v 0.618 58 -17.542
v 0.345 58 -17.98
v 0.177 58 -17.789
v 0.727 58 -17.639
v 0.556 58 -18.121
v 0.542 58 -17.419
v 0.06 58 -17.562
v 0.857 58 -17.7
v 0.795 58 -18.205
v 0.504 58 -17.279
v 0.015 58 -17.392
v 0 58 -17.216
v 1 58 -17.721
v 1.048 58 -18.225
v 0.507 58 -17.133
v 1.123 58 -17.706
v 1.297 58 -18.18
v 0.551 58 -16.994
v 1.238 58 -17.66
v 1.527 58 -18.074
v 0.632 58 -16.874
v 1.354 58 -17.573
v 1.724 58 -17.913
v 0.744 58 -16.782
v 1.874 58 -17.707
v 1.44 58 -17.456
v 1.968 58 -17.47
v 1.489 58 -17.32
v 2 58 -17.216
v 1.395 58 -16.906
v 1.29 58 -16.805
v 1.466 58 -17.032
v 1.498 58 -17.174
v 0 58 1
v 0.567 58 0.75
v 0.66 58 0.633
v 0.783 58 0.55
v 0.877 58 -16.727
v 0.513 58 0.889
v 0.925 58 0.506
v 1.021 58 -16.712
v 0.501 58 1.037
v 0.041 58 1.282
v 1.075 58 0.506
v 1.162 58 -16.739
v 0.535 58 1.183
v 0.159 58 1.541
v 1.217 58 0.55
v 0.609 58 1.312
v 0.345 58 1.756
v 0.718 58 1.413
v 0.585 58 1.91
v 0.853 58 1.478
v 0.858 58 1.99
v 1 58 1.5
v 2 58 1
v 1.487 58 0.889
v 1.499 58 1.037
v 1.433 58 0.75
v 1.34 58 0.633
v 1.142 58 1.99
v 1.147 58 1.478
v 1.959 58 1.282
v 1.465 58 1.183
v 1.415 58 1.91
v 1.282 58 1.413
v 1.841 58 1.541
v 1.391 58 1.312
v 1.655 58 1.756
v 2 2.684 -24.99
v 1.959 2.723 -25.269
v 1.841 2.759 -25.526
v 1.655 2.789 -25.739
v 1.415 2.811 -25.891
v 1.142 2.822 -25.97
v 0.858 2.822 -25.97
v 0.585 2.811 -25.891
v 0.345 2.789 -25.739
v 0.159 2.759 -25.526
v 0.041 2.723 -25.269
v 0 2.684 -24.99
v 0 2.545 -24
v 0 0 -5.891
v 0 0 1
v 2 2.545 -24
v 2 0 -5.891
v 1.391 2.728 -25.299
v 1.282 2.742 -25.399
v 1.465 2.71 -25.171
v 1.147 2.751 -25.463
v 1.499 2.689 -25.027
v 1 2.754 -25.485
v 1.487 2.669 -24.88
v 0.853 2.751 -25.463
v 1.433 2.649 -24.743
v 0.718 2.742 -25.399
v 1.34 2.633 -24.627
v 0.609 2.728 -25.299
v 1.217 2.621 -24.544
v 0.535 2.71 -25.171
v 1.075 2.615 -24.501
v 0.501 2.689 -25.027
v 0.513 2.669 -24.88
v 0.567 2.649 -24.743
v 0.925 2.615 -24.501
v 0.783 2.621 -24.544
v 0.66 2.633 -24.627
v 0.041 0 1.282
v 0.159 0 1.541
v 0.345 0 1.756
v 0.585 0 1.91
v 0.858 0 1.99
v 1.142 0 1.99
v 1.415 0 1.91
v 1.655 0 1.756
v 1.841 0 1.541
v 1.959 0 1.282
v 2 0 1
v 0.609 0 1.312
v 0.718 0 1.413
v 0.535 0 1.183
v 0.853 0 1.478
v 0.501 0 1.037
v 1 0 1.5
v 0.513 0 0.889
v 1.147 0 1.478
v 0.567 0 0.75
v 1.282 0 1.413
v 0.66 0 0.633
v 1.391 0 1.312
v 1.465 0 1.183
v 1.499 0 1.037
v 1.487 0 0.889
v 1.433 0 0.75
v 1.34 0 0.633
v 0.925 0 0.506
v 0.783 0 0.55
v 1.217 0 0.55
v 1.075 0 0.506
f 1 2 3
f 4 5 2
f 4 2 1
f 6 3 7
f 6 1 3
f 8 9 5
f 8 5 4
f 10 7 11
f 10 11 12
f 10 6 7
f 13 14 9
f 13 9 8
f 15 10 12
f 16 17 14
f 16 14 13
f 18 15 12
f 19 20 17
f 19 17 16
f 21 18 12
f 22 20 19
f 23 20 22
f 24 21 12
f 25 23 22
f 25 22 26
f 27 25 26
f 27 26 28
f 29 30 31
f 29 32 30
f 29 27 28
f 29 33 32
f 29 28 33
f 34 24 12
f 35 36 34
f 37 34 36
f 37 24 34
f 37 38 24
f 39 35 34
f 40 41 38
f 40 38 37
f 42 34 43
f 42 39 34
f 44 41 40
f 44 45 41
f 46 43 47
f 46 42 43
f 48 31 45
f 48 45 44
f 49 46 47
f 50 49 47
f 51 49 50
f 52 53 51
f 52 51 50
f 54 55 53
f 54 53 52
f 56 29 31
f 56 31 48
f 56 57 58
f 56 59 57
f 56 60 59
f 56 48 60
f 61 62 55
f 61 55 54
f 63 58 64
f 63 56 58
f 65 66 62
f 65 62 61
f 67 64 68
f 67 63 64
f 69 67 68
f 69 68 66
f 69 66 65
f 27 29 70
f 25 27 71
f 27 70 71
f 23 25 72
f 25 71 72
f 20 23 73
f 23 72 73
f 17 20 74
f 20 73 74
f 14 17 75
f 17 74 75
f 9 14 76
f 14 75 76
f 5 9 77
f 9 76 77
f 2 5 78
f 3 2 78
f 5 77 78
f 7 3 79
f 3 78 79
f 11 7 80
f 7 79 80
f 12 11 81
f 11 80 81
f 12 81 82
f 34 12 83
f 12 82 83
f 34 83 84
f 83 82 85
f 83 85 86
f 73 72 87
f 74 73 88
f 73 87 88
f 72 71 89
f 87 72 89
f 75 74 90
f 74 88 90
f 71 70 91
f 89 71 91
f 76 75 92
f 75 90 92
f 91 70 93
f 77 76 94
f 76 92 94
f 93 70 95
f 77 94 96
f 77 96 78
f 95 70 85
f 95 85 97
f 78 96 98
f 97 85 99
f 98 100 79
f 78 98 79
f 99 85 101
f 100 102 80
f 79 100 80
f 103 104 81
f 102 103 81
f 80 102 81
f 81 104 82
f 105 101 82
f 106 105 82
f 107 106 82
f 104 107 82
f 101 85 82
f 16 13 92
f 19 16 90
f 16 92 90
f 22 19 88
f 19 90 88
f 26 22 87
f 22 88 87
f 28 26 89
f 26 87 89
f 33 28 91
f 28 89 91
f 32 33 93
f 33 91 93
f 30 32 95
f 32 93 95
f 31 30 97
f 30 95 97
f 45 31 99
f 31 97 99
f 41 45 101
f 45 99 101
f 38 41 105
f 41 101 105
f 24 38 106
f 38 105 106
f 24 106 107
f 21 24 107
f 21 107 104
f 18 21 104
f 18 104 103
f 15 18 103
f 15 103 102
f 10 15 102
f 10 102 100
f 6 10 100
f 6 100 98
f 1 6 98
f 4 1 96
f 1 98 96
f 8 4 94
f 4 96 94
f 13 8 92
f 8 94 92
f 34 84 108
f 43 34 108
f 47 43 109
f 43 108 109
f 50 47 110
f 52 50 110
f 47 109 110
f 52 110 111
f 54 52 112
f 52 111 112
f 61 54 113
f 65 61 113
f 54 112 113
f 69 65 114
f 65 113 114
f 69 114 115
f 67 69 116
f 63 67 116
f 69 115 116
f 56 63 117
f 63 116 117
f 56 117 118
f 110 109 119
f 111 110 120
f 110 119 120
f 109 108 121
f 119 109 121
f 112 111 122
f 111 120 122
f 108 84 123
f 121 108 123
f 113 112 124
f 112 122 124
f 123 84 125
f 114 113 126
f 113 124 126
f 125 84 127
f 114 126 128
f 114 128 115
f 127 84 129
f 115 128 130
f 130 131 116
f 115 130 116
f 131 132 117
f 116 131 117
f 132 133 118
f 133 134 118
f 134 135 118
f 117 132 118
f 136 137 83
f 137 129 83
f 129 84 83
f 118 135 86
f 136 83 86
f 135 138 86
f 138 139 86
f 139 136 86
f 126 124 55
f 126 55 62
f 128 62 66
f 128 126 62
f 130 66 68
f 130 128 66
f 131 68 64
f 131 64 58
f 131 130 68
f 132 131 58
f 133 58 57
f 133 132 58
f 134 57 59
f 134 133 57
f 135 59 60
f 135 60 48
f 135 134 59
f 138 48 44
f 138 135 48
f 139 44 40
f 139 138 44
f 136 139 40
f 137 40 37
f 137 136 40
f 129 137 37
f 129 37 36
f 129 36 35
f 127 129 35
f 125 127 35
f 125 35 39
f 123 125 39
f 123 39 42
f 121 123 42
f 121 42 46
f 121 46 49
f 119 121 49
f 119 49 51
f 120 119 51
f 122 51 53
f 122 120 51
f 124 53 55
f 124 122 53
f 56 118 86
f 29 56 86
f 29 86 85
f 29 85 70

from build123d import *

# Parameters (mm, degrees)
EXTRUDE_1_DEPTH = 2
SKETCH_2_R      = 0.5
EXTRUDE_2_DEPTH = 58
EXTRUDE_3_REACH = 65.509
SKETCH_3_R      = 0.5


with BuildPart() as part:
    # Эскиз1 → Бобышка-Вытянуть1 (new body)
    with BuildSketch(Plane(origin=(0, 0, 0), x_dir=(0, 0, -1), z_dir=(1, 0, 0))):
        Polygon((0, 58), (16.206306346, 58), (24, 2.54498815), (5.89146837, 0), (0, 0), align=None)
    extrude(amount=EXTRUDE_1_DEPTH)

    # Эскиз2 → Бобышка-Вытянуть2 (add)
    with BuildSketch(Plane(origin=(0, 0, 0), x_dir=(1, 0, 0), z_dir=(0, 1, 0))):
        with BuildLine():
            Line((2, 0), (0, 0))
            Line((0, 0), (0, -1))
            ThreePointArc((0, -1), (1, -2), (2, -1))
            Line((2, -1), (2, 0))
        make_face()
        with Locations(Location((1, -1, 0), (0, 0, 270))):
            Circle(SKETCH_2_R, mode=Mode.SUBTRACT)
    extrude(amount=EXTRUDE_2_DEPTH)

    # Бобышка-Вытянуть3: up to this plane
    extrude_3_end = Plane(origin=(2, 58, 0), z_dir=(0, 1, 0))
    # Эскиз3 → Бобышка-Вытянуть3 (add, up to the surface)
    with BuildSketch(Plane(origin=(0, -0.811954382, -0.114112747), x_dir=(1, 0, 0), z_dir=(0, -0.9902680687415703, -0.13917310096006588)), mode=Mode.PRIVATE) as extrude_3_sk1:
        with BuildLine():
            Line((0, -25.120627543), (0, -24.120627543))
            Line((0, -24.120627543), (2, -24.120627543))
            Line((2, -24.120627543), (2, -25.120627543))
            ThreePointArc((2, -25.120627543), (1, -26.120627543), (0, -25.120627543))
        make_face()
        with Locations(Location((1, -25.120627543, 0), (0, 0, 270))):
            Circle(SKETCH_3_R, mode=Mode.SUBTRACT)
    extrude_3_tool1 = split(extrude(extrude_3_sk1.sketch, amount=-EXTRUDE_3_REACH, mode=Mode.PRIVATE), bisect_by=extrude_3_end, keep=Keep.BOTH, mode=Mode.PRIVATE)
    add(extrude_3_tool1.solids().sort_by_distance((1, 2.819398, -25.952527))[0])


solid = part.part
